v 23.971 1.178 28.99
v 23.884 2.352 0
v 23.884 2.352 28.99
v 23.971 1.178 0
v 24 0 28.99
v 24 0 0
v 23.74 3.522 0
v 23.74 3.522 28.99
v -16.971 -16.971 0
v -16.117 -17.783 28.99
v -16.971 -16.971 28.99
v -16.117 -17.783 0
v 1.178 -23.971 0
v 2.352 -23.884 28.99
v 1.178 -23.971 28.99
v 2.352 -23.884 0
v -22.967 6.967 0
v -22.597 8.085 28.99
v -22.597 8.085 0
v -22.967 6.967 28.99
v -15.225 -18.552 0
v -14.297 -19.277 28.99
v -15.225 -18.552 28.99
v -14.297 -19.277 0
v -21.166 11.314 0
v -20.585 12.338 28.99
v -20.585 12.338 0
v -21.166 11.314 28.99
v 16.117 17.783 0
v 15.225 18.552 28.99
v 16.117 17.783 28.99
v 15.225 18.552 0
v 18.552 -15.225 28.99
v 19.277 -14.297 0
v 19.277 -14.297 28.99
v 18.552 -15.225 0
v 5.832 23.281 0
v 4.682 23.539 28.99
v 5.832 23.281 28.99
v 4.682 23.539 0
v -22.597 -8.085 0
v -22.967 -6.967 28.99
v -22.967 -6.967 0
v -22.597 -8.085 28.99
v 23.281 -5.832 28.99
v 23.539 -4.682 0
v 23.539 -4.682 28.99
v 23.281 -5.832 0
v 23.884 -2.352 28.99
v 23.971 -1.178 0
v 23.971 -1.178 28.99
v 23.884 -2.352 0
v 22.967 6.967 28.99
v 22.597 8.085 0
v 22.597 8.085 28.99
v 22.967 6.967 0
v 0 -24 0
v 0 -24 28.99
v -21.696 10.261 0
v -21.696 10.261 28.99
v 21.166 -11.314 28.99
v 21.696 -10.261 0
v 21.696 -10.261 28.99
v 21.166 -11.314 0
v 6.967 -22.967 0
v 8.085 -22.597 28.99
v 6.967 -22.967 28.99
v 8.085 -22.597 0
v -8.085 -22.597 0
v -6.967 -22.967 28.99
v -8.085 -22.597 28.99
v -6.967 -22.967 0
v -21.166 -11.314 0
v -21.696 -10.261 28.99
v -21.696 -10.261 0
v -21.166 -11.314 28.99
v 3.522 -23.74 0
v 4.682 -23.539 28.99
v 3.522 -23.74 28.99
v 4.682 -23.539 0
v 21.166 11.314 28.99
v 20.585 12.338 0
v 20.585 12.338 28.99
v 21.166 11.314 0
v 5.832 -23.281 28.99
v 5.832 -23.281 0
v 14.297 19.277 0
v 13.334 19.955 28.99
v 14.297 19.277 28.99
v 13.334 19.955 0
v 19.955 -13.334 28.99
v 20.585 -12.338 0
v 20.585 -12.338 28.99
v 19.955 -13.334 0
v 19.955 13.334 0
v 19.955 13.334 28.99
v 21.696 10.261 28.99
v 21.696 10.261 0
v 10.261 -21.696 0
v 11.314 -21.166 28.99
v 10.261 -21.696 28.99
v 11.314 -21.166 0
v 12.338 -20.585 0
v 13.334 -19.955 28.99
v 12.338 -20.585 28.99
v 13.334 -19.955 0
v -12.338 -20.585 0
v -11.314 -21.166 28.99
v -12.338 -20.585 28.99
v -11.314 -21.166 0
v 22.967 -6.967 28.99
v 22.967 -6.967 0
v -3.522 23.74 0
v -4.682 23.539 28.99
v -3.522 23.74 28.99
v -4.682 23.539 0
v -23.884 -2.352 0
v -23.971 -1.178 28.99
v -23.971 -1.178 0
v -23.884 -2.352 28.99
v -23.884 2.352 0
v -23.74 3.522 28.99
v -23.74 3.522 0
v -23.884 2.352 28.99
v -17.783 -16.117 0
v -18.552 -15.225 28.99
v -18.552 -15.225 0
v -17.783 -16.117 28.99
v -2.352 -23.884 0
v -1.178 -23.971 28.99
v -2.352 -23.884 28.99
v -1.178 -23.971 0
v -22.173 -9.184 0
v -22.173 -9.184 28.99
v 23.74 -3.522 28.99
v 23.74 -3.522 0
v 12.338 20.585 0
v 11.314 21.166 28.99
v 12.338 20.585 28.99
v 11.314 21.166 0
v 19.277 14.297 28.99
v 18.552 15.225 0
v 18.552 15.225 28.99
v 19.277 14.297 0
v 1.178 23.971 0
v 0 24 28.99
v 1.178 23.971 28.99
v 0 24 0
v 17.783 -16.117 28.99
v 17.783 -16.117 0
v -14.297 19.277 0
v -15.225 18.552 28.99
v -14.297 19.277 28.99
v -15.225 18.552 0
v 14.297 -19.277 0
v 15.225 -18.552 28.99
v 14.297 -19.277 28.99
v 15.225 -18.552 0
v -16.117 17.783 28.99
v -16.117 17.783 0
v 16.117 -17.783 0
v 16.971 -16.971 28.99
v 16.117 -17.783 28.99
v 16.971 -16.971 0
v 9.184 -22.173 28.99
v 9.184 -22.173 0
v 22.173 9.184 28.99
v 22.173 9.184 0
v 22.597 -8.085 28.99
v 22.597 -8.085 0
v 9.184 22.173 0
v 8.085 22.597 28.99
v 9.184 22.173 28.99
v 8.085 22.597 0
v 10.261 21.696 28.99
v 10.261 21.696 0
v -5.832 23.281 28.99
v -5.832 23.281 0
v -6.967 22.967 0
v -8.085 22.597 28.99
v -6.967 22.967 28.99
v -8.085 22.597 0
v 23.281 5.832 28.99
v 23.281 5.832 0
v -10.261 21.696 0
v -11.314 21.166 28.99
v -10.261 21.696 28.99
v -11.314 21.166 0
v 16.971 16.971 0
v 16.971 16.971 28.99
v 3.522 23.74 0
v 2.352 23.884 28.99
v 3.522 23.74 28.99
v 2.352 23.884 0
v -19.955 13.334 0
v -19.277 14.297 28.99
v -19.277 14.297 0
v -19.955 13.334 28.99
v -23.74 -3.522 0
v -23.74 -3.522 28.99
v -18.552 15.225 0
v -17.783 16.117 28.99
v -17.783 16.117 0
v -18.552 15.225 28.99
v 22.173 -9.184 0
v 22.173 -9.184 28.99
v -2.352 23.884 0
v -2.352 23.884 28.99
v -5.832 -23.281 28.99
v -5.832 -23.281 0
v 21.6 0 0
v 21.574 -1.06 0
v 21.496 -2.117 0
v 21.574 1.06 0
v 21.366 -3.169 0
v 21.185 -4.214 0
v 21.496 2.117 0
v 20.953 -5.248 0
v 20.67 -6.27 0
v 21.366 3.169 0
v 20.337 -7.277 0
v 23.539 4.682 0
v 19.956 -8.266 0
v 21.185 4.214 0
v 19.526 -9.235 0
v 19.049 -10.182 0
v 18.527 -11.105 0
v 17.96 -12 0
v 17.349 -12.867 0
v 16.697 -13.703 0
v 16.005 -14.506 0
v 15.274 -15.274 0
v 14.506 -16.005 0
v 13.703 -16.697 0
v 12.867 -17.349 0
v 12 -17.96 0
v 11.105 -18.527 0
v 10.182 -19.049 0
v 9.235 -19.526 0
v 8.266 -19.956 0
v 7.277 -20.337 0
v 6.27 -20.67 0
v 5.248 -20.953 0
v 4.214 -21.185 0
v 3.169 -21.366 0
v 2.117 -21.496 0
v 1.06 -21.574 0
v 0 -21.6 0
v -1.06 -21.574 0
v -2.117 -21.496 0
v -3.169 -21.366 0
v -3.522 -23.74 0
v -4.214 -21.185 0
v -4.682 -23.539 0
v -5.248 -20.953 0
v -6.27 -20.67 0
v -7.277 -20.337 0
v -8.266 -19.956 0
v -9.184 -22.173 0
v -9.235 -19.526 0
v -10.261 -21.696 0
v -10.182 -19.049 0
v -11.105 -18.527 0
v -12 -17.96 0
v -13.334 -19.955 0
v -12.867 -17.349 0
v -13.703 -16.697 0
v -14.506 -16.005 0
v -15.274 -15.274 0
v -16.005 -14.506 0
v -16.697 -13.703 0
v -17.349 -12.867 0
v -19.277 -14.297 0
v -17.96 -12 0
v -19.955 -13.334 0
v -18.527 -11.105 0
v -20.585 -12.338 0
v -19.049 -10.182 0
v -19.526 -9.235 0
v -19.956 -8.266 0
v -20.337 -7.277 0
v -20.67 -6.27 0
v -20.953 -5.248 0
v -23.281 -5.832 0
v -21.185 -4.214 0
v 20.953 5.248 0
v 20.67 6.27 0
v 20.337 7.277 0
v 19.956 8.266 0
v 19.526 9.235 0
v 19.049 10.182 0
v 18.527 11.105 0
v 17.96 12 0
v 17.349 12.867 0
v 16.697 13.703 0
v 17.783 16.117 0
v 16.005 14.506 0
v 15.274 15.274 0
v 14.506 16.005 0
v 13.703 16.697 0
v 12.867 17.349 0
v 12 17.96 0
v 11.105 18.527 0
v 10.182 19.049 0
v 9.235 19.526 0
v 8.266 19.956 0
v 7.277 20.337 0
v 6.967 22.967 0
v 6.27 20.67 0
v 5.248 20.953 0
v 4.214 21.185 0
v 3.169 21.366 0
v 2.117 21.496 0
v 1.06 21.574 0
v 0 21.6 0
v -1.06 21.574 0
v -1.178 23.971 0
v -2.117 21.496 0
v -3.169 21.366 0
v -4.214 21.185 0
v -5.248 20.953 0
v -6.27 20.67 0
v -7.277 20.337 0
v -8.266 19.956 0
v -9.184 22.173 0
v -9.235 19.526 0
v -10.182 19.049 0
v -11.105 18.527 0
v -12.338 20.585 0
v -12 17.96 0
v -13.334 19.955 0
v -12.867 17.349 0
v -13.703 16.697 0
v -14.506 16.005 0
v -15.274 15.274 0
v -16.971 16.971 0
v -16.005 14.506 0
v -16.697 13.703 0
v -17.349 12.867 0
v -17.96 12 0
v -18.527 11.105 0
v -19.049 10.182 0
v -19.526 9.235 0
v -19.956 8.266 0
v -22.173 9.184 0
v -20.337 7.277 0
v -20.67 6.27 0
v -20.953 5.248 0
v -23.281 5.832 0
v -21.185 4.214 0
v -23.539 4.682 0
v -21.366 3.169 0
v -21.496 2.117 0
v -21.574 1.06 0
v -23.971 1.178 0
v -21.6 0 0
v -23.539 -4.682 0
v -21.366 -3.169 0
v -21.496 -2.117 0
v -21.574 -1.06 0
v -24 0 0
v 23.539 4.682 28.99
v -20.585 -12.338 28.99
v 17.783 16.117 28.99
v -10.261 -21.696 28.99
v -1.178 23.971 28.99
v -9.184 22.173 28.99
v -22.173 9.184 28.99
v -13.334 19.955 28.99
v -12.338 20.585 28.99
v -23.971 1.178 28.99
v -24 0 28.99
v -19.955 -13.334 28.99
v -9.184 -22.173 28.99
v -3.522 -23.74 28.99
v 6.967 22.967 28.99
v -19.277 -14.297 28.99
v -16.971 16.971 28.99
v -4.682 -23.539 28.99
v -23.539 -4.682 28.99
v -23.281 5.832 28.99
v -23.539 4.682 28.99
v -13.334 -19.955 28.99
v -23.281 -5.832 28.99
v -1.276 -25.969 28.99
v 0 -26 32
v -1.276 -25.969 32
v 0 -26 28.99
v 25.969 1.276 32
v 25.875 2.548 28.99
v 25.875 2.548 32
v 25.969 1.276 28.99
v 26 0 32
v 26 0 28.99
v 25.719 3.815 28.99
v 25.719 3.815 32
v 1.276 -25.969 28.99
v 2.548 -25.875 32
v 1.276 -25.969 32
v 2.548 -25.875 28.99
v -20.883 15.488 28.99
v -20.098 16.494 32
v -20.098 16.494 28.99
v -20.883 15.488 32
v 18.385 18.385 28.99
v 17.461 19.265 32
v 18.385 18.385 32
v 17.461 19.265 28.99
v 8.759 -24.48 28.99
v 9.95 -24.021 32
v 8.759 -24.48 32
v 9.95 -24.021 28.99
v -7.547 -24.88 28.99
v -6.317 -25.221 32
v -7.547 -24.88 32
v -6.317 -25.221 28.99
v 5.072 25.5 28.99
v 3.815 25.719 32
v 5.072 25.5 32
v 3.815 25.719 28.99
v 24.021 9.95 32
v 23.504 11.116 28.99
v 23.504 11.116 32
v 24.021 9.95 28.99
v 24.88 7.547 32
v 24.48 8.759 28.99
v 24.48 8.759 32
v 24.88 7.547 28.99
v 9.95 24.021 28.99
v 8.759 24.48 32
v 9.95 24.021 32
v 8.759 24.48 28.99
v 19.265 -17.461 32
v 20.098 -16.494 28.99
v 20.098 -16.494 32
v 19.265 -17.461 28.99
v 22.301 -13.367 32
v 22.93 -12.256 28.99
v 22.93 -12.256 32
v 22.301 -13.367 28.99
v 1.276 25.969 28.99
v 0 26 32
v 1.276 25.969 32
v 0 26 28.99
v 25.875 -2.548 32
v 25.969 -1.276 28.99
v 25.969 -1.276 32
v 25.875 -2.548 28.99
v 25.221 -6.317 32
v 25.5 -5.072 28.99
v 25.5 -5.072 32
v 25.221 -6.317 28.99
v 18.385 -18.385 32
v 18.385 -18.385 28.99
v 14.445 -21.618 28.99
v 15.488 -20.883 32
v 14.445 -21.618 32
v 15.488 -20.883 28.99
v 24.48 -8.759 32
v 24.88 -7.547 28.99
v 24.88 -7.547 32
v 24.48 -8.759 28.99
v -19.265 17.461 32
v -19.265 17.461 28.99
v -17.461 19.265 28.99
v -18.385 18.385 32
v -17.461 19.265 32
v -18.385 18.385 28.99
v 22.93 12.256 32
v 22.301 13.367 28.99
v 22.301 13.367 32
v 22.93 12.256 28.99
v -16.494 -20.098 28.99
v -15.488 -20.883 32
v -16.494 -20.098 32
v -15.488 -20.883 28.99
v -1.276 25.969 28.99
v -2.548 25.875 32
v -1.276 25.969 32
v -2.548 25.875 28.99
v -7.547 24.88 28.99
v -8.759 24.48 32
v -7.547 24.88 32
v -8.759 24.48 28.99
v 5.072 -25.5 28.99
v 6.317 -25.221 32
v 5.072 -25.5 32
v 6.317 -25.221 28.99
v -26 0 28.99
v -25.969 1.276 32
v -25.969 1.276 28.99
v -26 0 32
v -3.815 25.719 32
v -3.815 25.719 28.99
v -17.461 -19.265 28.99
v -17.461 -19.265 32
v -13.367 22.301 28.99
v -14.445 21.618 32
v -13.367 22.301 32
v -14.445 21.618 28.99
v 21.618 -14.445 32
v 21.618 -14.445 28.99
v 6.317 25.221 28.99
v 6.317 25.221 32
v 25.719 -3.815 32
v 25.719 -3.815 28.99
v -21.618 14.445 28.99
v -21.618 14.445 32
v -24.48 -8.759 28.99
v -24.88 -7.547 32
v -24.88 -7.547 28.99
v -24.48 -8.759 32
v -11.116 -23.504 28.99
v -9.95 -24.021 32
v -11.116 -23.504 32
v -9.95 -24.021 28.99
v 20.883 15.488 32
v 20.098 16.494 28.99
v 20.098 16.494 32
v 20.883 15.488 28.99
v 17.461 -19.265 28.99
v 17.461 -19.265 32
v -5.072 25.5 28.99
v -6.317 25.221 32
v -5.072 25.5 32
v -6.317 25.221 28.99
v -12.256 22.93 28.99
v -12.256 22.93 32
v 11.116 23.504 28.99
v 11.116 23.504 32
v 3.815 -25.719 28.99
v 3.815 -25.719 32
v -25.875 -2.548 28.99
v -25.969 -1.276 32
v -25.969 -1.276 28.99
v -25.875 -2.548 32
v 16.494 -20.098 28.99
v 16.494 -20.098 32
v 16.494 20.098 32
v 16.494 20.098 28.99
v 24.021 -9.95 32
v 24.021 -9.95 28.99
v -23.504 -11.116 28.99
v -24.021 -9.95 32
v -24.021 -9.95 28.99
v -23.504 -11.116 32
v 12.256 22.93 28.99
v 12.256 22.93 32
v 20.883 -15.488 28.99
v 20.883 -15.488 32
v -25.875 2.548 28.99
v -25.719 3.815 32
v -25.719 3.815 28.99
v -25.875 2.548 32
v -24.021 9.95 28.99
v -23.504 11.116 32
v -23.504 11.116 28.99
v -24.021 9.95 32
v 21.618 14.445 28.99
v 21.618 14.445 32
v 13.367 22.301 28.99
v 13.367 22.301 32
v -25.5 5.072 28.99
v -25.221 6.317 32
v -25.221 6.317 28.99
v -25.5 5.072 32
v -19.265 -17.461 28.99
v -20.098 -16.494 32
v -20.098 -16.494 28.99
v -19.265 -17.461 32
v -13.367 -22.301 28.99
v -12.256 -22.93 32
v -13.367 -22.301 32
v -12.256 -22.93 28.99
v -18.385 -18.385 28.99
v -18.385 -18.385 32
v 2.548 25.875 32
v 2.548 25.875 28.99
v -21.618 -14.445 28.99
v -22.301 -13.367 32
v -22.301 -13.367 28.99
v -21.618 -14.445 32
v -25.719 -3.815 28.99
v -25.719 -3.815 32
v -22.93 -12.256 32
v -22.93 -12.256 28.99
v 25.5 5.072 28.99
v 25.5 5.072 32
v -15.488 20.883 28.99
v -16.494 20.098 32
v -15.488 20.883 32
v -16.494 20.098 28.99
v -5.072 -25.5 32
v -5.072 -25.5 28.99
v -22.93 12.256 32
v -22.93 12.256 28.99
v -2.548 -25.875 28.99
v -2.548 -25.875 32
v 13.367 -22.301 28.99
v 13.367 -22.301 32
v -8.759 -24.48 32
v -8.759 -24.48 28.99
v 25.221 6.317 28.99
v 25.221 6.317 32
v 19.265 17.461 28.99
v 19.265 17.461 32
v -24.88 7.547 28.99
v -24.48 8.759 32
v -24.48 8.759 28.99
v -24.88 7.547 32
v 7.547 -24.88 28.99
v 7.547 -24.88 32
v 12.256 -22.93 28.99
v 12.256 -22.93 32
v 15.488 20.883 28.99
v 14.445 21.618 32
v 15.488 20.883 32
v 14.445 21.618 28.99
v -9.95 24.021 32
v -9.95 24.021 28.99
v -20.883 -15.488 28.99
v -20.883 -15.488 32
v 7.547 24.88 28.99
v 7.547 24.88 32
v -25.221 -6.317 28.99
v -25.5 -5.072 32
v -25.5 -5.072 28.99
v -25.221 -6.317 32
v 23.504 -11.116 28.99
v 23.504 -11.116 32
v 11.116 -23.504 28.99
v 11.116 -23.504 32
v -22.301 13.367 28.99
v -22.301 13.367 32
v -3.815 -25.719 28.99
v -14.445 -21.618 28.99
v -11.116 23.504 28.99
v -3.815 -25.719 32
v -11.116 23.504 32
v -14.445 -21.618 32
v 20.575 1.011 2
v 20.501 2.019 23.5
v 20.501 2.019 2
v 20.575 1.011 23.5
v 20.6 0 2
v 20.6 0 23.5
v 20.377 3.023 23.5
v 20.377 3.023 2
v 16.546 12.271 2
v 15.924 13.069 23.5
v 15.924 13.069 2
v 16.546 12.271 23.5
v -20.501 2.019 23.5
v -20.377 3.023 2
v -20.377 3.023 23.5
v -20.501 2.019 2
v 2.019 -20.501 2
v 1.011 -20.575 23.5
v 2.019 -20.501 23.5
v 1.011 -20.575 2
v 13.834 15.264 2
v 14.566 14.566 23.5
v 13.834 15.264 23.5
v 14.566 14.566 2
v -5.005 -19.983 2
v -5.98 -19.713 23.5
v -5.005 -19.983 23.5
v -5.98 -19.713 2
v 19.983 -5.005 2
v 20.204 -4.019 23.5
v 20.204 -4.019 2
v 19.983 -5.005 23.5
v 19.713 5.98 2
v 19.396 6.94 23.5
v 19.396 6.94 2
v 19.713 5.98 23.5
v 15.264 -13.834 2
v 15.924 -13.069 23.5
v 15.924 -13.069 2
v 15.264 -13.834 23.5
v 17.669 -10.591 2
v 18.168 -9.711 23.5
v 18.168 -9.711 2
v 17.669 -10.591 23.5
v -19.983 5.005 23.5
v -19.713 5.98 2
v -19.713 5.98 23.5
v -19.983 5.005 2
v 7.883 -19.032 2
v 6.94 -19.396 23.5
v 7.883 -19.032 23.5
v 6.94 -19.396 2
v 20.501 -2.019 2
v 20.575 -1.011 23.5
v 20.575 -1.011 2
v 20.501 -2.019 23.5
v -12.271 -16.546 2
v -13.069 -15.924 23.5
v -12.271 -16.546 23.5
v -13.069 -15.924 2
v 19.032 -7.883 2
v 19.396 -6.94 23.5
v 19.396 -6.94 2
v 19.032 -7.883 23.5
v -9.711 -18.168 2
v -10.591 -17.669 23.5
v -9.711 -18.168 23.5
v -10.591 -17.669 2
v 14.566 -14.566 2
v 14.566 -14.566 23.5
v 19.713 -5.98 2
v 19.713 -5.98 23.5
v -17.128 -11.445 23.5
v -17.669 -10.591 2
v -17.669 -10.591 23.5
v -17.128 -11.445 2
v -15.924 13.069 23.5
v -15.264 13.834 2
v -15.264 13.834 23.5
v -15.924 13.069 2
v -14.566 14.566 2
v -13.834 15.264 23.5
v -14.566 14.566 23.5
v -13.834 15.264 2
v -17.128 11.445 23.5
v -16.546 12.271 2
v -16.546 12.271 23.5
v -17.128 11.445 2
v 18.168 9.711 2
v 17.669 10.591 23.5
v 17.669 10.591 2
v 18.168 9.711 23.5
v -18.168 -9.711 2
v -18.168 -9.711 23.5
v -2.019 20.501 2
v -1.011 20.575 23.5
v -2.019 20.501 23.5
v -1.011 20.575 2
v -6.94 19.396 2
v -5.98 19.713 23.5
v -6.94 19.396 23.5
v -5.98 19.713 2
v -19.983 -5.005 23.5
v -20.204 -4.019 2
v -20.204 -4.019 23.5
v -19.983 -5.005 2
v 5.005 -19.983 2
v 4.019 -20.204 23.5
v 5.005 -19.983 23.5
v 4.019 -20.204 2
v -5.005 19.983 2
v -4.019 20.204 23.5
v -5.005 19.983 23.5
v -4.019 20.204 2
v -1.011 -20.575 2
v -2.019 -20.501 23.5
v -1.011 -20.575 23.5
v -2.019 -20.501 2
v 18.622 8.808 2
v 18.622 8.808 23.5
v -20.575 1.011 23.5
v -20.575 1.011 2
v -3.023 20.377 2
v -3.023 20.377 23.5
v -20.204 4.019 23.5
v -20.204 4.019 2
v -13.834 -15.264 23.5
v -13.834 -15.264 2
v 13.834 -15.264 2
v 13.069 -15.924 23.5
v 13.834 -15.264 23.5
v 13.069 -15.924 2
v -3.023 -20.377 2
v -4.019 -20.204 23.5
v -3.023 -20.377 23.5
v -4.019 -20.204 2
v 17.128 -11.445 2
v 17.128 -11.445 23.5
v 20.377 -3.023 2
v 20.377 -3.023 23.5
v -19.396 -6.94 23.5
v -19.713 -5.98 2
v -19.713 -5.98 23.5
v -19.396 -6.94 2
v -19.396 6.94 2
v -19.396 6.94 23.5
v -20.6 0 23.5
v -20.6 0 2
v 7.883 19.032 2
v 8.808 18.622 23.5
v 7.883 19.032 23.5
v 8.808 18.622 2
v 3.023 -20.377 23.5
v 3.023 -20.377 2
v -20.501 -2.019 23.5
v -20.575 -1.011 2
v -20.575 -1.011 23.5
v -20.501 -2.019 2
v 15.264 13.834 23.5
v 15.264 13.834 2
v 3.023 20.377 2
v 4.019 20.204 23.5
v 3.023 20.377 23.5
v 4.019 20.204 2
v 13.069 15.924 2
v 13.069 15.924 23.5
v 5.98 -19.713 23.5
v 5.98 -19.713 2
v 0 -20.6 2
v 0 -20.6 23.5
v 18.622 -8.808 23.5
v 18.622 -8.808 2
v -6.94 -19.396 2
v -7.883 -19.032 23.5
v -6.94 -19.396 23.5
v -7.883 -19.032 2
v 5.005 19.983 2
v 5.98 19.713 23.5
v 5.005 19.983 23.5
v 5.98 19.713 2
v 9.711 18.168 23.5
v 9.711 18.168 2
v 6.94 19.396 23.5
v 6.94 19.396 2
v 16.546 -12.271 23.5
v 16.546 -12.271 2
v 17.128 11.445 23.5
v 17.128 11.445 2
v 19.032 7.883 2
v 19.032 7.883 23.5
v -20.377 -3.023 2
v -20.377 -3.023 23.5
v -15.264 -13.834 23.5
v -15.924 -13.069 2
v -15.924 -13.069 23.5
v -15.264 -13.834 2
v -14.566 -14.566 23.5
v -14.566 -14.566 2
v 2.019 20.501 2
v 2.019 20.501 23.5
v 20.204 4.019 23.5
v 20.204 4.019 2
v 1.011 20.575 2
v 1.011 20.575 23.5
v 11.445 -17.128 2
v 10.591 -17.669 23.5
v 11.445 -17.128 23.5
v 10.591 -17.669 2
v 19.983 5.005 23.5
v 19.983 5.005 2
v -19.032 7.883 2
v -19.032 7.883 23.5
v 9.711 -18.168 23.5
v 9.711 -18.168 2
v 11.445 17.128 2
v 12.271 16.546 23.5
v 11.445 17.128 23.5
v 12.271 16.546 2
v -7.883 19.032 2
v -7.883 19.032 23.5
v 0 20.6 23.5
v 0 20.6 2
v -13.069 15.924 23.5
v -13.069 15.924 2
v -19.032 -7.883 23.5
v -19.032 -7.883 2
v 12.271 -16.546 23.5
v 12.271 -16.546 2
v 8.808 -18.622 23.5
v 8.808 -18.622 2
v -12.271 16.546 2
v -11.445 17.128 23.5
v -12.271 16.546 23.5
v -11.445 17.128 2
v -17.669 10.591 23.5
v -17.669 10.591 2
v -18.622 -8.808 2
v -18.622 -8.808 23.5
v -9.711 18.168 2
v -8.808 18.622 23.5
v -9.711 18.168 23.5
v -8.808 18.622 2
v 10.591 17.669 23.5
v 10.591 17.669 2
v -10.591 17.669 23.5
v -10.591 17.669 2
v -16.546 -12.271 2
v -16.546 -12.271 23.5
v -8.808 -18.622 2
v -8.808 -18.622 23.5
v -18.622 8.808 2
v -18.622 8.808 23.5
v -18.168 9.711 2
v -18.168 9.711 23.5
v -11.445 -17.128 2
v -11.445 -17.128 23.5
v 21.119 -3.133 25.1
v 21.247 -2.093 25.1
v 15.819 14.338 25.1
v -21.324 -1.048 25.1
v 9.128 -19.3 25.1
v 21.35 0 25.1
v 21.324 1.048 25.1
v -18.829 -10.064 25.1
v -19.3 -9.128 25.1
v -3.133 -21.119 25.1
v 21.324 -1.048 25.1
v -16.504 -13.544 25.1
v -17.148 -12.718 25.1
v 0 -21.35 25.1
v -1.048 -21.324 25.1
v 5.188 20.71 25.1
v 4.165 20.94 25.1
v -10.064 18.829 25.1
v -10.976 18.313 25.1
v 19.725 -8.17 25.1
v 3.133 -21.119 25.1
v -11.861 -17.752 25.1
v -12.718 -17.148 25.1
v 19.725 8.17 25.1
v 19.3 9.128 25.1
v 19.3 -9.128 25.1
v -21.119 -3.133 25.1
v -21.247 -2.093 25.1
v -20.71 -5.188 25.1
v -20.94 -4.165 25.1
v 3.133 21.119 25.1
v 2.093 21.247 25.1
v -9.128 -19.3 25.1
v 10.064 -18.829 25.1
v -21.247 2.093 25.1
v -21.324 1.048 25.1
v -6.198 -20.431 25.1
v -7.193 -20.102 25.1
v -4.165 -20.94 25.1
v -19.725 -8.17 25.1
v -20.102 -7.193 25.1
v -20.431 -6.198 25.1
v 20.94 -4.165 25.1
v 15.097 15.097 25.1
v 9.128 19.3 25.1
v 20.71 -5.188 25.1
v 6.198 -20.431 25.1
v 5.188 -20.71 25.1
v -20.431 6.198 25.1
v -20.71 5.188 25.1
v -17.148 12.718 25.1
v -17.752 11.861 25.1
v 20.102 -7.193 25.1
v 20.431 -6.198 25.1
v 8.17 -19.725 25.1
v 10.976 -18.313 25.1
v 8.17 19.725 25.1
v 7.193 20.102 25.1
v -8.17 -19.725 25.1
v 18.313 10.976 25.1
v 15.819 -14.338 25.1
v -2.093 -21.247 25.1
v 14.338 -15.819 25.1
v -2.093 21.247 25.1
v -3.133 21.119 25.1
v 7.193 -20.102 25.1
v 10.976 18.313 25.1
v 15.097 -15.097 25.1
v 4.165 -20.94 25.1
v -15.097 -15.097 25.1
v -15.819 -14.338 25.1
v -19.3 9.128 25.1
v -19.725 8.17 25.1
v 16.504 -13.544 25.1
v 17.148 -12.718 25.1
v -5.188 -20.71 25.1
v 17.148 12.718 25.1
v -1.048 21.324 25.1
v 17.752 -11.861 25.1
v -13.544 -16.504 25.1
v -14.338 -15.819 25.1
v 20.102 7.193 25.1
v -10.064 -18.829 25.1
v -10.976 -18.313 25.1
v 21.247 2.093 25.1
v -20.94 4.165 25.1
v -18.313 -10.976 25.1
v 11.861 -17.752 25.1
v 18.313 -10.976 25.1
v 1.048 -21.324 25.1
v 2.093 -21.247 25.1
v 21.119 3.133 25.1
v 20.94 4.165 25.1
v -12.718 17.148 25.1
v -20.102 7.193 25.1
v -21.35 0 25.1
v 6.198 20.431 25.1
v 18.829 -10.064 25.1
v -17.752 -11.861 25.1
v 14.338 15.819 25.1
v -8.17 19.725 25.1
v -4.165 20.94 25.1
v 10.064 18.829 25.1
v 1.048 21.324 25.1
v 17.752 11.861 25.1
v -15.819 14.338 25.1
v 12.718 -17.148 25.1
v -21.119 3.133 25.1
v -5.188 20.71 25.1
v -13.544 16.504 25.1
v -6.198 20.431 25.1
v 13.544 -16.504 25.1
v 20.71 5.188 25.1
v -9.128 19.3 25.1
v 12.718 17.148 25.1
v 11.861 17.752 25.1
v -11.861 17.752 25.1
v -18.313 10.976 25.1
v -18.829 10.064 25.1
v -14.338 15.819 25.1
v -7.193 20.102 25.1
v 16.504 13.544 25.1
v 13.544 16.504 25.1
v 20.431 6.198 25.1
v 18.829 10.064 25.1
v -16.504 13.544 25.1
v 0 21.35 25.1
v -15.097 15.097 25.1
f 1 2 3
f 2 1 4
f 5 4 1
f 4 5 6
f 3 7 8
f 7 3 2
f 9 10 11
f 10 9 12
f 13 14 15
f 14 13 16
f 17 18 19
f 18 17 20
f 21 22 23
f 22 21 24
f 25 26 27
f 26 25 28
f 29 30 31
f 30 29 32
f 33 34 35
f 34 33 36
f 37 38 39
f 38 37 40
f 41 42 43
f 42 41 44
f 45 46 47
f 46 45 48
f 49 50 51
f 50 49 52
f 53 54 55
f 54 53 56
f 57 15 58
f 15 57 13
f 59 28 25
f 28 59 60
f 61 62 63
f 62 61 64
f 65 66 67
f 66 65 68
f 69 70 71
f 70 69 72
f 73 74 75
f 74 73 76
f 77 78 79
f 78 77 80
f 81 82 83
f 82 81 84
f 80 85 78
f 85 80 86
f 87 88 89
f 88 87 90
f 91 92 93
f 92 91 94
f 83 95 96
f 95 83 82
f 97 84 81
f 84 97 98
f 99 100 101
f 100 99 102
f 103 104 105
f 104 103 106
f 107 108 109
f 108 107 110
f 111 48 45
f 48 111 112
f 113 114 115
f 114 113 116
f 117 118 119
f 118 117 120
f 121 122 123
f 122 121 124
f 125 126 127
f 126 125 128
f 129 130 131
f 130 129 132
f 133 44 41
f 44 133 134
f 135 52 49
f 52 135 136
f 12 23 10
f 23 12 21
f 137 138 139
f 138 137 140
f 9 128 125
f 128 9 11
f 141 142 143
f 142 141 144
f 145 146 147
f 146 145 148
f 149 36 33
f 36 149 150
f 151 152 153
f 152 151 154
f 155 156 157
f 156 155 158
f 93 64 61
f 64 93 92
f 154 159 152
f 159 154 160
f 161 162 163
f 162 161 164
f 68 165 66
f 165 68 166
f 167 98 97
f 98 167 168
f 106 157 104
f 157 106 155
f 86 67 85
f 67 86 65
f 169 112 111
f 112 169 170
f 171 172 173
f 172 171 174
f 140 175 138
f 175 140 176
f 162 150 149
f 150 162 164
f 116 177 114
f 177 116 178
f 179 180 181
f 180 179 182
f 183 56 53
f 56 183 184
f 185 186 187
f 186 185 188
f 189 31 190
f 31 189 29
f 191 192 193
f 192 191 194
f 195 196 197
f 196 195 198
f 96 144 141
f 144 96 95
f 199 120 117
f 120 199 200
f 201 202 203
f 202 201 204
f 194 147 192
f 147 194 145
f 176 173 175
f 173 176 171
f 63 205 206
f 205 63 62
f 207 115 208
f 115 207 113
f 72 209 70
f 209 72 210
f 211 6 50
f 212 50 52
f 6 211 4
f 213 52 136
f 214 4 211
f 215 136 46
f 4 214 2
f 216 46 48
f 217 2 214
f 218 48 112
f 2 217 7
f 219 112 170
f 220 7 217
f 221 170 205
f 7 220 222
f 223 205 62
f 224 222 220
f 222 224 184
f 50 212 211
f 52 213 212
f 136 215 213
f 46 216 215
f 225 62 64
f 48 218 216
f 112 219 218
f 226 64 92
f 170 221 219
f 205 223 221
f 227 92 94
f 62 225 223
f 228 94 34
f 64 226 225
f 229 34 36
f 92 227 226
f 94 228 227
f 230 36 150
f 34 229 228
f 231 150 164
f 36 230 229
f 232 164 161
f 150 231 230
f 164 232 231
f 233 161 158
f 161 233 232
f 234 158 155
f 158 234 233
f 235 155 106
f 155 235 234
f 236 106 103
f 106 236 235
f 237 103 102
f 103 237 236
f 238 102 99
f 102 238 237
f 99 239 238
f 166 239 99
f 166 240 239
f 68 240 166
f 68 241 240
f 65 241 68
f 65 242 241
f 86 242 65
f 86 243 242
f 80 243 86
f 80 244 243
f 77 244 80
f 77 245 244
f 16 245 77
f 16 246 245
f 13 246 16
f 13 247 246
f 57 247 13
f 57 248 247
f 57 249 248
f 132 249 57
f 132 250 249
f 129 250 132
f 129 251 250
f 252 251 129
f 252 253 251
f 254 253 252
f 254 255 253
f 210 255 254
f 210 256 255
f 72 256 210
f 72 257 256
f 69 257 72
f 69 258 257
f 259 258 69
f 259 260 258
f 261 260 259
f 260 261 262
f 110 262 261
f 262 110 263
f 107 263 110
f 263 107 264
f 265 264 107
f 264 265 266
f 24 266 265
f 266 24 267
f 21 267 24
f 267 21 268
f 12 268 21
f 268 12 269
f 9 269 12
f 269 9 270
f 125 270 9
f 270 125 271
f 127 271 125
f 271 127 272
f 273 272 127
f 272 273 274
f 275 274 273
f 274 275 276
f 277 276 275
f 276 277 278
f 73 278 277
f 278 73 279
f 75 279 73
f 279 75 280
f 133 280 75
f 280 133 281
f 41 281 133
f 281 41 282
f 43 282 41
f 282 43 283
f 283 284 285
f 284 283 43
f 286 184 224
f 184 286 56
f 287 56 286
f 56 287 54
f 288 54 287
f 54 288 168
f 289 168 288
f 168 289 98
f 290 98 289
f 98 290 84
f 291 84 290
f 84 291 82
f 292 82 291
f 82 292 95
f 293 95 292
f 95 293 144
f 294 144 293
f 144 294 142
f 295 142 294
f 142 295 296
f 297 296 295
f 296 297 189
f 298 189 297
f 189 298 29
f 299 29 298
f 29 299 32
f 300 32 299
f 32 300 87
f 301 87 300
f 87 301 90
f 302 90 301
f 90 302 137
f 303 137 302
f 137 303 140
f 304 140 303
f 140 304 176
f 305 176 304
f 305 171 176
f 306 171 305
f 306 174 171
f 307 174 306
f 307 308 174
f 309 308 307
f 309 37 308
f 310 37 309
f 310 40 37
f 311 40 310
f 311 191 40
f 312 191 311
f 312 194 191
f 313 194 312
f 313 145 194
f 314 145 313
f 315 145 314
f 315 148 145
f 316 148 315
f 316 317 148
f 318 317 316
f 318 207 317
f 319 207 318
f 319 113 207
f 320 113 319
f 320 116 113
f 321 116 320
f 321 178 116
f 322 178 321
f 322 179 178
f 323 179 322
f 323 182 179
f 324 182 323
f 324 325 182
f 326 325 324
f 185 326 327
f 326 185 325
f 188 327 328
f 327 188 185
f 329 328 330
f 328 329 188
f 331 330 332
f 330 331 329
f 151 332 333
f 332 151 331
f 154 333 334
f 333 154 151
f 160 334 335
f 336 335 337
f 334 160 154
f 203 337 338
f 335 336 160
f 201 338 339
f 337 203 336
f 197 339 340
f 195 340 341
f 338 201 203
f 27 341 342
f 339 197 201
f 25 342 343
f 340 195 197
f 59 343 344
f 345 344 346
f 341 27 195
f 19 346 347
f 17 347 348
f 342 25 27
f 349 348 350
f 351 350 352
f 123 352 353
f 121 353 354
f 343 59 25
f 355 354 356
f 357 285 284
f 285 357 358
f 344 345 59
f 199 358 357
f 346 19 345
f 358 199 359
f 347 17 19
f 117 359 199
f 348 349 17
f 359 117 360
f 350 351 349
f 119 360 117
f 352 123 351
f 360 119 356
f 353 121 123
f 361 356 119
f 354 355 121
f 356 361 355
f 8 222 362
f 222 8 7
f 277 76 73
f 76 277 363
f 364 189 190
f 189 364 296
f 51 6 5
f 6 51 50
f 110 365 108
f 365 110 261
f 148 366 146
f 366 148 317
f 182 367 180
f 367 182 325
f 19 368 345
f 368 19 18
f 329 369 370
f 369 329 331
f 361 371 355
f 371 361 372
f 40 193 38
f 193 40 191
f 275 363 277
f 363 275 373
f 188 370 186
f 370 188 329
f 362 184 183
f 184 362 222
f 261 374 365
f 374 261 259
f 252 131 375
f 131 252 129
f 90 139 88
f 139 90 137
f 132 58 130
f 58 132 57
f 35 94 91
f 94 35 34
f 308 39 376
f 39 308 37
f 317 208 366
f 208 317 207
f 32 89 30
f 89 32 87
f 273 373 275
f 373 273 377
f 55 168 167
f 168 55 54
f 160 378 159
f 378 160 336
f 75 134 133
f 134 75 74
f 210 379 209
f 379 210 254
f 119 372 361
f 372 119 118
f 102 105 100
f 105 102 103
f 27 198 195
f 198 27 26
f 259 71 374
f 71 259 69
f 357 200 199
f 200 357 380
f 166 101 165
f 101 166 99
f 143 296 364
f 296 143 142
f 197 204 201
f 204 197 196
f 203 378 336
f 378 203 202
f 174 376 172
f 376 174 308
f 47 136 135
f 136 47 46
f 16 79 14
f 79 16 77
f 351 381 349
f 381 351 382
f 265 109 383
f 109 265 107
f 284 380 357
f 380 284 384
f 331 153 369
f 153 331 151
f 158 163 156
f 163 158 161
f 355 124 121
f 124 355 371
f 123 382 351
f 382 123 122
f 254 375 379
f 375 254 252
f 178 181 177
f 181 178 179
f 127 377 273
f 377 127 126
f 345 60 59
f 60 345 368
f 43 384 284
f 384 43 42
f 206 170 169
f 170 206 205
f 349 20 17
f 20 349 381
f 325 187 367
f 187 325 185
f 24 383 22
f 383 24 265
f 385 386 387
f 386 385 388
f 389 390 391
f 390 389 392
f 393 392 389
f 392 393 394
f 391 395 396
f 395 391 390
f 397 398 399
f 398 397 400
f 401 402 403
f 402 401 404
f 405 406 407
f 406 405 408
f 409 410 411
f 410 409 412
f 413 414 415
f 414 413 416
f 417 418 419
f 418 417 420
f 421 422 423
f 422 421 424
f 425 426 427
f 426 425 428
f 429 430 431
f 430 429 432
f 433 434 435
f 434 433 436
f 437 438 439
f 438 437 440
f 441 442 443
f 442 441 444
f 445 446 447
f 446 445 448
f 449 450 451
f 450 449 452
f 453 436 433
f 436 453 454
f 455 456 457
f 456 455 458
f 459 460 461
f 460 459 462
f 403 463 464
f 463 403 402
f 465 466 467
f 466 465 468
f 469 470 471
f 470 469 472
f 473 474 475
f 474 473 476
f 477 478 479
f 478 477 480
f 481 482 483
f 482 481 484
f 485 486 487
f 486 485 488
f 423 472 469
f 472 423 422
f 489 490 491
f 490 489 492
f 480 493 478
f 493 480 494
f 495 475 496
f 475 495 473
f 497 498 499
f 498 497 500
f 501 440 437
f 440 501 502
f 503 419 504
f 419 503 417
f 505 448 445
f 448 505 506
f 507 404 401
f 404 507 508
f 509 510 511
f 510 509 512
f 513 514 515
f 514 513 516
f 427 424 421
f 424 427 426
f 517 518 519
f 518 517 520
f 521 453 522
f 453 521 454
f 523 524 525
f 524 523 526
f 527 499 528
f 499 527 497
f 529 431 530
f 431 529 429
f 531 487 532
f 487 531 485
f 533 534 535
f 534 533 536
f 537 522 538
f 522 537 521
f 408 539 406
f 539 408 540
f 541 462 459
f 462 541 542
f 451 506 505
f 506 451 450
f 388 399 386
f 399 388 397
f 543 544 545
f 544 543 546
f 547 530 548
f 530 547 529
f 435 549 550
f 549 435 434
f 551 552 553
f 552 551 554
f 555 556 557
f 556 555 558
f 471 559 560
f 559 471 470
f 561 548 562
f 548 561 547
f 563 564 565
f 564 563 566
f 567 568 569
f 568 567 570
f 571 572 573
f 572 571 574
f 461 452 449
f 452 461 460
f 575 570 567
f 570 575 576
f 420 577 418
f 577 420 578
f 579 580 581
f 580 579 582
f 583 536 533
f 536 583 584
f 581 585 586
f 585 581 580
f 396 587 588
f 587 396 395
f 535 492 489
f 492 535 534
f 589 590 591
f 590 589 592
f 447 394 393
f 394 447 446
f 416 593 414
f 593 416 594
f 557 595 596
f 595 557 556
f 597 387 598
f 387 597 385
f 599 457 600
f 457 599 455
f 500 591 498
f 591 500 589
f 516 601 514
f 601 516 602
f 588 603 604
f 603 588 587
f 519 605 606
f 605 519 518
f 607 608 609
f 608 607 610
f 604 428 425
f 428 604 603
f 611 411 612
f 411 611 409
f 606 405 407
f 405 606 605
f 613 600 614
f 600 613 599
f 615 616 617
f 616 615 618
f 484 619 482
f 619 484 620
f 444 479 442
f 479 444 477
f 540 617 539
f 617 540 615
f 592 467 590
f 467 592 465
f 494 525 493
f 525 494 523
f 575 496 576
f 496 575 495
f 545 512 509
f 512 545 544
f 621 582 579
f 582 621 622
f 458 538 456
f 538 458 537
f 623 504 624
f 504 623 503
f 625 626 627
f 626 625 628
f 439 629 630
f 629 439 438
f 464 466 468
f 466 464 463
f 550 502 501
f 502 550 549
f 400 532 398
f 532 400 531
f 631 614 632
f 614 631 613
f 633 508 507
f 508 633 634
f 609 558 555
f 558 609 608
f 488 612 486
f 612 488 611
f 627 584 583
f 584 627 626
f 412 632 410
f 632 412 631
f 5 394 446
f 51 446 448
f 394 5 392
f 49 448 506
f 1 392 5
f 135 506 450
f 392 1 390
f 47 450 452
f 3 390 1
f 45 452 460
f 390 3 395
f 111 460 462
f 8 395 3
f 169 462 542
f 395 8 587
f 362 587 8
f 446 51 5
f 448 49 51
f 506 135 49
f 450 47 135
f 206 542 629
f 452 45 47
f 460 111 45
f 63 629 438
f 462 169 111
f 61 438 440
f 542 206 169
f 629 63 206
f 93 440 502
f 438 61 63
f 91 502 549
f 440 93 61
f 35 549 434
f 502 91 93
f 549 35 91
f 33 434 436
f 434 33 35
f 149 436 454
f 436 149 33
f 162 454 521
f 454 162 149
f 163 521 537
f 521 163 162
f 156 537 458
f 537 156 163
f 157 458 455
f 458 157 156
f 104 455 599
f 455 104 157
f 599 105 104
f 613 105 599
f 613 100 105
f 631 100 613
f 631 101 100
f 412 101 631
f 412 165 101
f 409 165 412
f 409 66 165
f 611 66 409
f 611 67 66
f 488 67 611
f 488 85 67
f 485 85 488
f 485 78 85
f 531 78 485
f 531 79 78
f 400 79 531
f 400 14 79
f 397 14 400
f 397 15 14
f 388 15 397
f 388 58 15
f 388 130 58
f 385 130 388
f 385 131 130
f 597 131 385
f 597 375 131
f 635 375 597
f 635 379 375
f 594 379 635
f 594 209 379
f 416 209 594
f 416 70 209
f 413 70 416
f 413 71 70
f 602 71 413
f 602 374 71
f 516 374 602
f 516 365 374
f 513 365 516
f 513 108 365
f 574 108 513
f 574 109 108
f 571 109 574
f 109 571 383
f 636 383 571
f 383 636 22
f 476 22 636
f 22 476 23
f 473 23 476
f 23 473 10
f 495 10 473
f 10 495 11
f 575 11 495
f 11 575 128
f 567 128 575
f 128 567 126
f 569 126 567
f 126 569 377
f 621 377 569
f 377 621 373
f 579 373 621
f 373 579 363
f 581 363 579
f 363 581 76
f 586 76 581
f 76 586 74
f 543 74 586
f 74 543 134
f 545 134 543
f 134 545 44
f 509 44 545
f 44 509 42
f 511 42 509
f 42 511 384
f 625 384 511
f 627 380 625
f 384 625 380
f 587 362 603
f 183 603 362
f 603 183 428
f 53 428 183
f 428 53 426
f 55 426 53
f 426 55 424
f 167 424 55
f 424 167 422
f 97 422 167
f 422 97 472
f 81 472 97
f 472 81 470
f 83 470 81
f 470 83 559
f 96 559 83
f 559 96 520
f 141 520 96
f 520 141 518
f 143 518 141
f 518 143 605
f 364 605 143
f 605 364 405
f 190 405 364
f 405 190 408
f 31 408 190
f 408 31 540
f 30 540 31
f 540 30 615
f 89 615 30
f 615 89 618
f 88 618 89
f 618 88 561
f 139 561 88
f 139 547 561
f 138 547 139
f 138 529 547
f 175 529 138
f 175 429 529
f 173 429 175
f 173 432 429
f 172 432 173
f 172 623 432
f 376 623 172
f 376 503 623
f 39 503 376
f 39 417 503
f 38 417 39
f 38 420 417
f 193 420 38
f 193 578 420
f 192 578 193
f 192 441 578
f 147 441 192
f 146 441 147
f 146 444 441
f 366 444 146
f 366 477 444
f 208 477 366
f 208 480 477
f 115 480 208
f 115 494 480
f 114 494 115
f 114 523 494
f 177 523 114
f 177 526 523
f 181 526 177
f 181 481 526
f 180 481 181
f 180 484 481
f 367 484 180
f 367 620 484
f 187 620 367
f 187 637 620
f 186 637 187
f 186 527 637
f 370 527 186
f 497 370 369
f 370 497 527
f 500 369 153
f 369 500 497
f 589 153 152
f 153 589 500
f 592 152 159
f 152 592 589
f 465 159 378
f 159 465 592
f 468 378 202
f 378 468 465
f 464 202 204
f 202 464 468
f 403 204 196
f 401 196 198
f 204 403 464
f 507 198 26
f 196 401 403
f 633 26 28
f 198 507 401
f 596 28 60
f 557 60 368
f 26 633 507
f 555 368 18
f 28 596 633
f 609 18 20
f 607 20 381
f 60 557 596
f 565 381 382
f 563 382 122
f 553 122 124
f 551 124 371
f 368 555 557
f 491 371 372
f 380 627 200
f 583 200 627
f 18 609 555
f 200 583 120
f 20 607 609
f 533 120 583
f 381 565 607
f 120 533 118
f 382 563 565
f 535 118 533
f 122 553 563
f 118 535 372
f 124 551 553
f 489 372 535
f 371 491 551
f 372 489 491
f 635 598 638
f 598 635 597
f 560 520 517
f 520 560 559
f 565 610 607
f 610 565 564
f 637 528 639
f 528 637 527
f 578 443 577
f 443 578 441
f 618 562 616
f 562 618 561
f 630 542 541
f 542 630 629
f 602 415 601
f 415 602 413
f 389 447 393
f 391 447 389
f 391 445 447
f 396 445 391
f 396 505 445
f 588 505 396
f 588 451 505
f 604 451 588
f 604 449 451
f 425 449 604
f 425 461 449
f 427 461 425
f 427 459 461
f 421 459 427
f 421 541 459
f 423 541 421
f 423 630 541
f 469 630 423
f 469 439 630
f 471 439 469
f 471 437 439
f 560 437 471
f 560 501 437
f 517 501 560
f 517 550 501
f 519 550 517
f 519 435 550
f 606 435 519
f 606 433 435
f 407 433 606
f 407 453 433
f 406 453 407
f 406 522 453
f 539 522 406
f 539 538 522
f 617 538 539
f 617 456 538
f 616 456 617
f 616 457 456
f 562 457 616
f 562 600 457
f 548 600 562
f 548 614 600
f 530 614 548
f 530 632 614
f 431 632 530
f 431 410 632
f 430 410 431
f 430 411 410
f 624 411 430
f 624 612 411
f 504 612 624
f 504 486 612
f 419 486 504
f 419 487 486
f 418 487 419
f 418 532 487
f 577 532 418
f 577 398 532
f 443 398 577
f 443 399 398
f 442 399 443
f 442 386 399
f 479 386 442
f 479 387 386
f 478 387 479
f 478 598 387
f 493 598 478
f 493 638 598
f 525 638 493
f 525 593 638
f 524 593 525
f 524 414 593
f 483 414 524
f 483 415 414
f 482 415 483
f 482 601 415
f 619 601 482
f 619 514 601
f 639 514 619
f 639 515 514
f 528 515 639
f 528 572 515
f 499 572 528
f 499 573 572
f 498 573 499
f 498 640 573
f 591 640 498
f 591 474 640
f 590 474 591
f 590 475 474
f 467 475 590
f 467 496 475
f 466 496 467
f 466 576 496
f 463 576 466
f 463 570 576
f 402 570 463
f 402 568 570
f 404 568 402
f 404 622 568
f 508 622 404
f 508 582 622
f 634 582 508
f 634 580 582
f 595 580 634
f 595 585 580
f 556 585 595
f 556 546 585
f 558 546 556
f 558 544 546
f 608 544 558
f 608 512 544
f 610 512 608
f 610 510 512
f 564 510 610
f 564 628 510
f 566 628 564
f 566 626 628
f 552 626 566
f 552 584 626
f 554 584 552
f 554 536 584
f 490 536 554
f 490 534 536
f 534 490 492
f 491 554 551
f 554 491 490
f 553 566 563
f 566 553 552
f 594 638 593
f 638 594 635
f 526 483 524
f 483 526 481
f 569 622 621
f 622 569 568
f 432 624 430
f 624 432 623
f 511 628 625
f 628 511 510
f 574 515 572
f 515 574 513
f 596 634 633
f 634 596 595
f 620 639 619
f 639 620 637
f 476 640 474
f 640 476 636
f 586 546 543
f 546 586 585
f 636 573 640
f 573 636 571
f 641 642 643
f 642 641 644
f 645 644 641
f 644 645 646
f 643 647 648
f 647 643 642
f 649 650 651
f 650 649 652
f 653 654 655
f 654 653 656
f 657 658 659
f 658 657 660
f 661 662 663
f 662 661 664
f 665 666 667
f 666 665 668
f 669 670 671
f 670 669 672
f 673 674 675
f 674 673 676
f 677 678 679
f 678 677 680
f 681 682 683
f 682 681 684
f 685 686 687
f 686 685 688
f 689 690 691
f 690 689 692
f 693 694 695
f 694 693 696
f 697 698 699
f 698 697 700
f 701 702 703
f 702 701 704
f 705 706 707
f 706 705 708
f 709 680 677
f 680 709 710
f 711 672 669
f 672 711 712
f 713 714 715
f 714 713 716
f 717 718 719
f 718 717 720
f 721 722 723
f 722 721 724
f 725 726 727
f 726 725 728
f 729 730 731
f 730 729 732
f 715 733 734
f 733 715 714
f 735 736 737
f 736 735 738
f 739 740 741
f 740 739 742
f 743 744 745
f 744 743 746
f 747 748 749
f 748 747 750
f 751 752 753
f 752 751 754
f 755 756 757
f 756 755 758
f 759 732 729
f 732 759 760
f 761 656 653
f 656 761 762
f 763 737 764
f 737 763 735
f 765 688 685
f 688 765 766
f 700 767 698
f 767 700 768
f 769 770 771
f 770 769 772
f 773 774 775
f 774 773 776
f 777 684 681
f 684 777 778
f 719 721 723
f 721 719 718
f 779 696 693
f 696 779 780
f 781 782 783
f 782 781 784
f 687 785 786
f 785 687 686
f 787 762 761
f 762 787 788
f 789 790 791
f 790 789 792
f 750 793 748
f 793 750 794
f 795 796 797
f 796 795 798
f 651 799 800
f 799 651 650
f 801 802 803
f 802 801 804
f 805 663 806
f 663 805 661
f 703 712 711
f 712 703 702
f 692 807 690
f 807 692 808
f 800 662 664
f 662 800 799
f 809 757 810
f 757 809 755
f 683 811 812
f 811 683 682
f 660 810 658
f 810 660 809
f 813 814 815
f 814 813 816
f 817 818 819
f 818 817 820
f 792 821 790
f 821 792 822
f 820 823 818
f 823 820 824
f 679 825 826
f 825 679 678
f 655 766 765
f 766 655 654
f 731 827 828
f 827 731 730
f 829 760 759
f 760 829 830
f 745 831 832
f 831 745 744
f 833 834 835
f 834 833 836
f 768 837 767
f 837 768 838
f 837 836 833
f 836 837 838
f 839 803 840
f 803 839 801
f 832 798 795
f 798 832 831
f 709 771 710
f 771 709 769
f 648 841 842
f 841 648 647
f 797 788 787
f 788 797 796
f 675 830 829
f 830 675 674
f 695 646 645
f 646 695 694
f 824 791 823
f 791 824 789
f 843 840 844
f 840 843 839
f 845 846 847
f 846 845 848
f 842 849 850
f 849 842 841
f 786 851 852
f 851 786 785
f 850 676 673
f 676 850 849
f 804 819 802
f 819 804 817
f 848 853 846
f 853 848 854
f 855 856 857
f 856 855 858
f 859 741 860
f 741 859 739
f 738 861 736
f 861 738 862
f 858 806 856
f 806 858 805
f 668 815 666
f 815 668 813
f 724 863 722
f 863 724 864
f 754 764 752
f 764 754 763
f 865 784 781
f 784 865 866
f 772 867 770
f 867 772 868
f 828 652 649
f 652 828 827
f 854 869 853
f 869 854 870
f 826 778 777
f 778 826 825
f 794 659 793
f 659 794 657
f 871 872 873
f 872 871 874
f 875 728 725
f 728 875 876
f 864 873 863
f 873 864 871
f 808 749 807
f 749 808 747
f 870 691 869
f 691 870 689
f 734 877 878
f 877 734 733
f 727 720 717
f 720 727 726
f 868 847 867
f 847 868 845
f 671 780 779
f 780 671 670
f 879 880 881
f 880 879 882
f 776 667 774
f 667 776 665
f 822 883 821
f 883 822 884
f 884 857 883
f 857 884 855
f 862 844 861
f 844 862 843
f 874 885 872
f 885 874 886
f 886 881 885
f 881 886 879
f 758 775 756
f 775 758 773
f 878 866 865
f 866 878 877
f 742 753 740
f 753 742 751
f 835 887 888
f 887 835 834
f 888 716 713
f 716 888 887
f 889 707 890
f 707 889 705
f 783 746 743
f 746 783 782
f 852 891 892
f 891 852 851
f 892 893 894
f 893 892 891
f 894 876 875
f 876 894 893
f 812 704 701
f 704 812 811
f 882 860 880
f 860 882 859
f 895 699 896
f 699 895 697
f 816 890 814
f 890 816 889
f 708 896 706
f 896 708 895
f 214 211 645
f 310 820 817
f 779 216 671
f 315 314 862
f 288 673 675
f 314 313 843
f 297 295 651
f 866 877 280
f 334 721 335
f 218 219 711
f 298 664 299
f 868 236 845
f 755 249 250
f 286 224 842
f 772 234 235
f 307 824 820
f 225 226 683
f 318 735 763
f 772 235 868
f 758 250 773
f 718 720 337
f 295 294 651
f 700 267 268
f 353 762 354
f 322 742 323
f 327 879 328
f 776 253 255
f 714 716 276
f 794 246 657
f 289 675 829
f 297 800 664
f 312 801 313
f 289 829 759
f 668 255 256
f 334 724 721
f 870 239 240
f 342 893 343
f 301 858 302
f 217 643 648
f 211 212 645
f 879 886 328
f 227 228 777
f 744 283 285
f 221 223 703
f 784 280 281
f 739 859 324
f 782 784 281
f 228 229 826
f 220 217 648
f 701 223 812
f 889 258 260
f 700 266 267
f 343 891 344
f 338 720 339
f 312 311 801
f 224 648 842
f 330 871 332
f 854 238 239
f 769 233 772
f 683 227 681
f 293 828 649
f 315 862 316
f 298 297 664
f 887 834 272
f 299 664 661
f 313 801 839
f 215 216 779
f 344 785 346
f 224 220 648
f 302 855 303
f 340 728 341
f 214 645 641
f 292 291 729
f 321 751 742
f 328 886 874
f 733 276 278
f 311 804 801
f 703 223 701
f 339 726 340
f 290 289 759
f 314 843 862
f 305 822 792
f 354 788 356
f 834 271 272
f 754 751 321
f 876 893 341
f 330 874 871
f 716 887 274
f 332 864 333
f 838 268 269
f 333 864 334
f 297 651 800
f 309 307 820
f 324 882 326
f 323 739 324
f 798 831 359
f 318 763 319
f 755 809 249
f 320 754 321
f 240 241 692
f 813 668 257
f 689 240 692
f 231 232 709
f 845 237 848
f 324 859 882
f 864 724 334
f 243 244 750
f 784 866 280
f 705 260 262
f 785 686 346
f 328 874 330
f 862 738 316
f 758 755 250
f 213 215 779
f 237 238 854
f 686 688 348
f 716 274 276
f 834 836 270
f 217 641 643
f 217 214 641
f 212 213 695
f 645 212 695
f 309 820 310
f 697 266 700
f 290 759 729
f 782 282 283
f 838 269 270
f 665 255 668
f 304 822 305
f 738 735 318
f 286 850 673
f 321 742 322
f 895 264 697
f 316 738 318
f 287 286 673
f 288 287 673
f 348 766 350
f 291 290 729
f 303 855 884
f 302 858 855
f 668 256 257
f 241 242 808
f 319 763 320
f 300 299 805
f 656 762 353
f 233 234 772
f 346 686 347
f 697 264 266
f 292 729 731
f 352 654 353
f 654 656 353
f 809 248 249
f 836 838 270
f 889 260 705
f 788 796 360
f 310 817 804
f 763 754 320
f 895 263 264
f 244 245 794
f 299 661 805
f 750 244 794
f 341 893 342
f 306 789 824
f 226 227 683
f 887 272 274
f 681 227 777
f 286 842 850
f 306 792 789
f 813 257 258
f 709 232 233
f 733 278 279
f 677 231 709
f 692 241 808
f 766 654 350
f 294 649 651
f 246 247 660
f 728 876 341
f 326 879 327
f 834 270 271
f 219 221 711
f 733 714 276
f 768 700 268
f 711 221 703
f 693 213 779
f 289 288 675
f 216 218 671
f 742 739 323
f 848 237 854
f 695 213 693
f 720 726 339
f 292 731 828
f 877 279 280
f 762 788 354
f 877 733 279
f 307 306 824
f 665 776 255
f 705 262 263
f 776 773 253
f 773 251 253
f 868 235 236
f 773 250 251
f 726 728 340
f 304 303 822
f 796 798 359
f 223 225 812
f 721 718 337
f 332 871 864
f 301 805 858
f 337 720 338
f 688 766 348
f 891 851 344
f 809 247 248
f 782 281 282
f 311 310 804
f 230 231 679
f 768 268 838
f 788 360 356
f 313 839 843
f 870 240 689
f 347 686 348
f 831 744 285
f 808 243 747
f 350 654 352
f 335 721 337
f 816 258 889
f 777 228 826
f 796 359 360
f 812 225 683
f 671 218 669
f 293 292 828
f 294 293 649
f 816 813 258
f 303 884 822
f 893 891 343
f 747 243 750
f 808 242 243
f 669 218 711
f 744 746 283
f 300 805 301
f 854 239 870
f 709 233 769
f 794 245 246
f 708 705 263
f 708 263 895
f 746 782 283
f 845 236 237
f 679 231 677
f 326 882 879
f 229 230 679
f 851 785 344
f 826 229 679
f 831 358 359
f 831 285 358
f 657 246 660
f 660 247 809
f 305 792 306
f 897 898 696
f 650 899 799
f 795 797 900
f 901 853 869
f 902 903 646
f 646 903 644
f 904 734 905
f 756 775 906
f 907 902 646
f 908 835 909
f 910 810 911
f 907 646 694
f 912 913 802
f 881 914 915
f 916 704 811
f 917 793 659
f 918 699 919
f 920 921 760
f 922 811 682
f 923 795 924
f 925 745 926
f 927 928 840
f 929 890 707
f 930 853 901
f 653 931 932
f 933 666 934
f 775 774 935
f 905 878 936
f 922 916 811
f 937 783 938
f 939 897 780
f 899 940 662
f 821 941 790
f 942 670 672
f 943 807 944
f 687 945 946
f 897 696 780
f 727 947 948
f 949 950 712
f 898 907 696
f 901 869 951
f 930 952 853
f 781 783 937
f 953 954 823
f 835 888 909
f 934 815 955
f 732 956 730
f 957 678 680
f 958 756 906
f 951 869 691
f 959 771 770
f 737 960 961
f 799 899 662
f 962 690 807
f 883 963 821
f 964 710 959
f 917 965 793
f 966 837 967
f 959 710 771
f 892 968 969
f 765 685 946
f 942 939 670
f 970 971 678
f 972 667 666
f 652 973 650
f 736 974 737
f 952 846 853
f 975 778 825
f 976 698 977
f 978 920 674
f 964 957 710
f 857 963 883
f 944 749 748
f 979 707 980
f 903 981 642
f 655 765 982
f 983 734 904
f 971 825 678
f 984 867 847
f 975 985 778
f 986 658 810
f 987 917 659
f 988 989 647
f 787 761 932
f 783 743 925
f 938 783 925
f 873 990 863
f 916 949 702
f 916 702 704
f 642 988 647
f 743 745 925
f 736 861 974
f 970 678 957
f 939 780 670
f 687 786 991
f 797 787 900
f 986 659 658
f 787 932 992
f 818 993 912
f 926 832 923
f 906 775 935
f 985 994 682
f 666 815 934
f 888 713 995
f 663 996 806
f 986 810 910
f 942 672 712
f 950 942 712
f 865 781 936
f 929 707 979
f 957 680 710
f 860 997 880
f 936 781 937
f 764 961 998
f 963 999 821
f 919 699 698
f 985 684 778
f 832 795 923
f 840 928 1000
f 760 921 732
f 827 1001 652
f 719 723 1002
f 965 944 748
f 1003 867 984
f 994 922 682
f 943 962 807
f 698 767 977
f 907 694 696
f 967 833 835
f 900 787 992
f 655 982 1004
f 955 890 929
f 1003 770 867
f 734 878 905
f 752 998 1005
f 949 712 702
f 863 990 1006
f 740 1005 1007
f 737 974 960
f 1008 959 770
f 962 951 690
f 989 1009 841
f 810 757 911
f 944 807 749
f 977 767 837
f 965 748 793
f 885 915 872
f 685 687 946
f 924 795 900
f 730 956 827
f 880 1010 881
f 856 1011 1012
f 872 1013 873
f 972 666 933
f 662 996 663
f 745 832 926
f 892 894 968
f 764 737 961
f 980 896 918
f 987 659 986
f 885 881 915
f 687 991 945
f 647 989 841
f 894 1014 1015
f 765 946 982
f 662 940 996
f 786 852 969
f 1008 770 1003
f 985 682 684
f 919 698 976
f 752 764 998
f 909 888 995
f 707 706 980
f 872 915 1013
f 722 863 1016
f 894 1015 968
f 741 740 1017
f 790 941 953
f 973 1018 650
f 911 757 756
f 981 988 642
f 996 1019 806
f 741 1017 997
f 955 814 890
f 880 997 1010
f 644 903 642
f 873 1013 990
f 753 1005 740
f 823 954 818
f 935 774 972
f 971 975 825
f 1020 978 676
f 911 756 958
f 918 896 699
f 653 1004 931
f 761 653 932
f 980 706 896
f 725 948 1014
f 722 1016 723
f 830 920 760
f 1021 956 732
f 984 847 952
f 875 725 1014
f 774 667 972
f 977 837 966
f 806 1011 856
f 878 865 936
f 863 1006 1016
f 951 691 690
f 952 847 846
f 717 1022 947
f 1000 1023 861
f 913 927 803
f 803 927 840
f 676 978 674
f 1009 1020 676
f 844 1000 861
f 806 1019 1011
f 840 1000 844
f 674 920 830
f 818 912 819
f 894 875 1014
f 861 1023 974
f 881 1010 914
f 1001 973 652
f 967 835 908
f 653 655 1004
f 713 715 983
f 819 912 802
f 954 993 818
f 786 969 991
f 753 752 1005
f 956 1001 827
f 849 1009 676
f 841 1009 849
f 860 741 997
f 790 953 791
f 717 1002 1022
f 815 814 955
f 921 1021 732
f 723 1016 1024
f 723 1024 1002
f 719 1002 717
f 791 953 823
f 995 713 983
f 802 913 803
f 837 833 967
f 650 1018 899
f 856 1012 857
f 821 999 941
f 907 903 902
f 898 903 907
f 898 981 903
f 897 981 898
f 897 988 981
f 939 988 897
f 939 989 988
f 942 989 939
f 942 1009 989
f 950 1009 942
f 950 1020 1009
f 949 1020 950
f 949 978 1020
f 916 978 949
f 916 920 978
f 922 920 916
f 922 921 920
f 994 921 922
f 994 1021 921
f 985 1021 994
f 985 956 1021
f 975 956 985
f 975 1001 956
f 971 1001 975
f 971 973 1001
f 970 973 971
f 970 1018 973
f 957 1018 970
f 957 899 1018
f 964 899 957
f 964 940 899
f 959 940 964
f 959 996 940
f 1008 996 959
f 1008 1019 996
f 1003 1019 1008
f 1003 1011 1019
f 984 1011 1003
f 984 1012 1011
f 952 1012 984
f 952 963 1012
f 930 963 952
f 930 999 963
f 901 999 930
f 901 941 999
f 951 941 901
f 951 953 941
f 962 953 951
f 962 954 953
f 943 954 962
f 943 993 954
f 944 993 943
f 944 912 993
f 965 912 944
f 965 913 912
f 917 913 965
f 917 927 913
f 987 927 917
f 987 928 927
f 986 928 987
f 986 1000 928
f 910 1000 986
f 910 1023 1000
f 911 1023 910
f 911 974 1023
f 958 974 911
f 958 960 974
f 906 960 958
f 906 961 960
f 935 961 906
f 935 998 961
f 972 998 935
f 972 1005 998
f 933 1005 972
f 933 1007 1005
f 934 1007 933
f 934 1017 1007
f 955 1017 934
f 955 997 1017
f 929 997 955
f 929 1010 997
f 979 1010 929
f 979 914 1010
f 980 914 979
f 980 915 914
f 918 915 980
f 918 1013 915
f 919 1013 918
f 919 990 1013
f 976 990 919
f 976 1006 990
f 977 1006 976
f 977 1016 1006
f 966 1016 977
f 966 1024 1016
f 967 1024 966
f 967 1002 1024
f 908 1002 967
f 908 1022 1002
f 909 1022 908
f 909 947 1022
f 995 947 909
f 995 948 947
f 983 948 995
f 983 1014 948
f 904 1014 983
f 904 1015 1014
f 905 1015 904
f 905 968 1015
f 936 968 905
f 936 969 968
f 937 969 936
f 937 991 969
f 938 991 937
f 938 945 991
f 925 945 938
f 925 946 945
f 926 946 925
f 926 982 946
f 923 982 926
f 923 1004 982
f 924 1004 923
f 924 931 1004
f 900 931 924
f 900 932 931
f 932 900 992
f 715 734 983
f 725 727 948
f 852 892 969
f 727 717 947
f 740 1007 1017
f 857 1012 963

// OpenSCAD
$fn = 128;

// HT 40 cap (end cap) - approximate dimensions
// Typical HT DN40: OD ~ 40 mm. Cap has a socket and a closed end.
// Parameters can be adjusted as needed.

dn_od = 40.0;          // nominal pipe outside diameter
socket_clear = 0.6;    // clearance for insertion
wall = 3.0;            // cap wall thickness
socket_depth = 25.0;   // insertion depth
end_thickness = 4.0;   // thickness of closed end
outer_extra = 4.0;     // extra outer diameter beyond pipe OD (cap body)
lip_height = 3.0;      // small outer lip height
lip_extra = 2.0;       // extra diameter for lip

outer_d = dn_od + outer_extra*2;
inner_d = dn_od + socket_clear*2;

total_h = socket_depth + end_thickness + lip_height;

module ht40_cap() {
    difference() {
        union() {
            // Main outer body
            cylinder(h = socket_depth + end_thickness, d = outer_d);

            // Outer lip / collar near opening
            translate([0,0,socket_depth + end_thickness - 0.01])
                cylinder(h = lip_height + 0.01, d = outer_d + lip_extra*2);
        }

        // Inner socket cavity (open end)
        translate([0,0,0])
            cylinder(h = socket_depth, d = inner_d);

        // Slight chamfer at opening (lead-in)
        translate([0,0,0])
            cylinder(h = 2.0, d1 = inner_d + 2.0, d2 = inner_d);

        // Optional inner corner relief at bottom of socket
        translate([0,0,socket_depth - 1.5])
            cylinder(h = 1.6, d1 = inner_d, d2 = inner_d + 1.5);
    }
}

ht40_cap();
